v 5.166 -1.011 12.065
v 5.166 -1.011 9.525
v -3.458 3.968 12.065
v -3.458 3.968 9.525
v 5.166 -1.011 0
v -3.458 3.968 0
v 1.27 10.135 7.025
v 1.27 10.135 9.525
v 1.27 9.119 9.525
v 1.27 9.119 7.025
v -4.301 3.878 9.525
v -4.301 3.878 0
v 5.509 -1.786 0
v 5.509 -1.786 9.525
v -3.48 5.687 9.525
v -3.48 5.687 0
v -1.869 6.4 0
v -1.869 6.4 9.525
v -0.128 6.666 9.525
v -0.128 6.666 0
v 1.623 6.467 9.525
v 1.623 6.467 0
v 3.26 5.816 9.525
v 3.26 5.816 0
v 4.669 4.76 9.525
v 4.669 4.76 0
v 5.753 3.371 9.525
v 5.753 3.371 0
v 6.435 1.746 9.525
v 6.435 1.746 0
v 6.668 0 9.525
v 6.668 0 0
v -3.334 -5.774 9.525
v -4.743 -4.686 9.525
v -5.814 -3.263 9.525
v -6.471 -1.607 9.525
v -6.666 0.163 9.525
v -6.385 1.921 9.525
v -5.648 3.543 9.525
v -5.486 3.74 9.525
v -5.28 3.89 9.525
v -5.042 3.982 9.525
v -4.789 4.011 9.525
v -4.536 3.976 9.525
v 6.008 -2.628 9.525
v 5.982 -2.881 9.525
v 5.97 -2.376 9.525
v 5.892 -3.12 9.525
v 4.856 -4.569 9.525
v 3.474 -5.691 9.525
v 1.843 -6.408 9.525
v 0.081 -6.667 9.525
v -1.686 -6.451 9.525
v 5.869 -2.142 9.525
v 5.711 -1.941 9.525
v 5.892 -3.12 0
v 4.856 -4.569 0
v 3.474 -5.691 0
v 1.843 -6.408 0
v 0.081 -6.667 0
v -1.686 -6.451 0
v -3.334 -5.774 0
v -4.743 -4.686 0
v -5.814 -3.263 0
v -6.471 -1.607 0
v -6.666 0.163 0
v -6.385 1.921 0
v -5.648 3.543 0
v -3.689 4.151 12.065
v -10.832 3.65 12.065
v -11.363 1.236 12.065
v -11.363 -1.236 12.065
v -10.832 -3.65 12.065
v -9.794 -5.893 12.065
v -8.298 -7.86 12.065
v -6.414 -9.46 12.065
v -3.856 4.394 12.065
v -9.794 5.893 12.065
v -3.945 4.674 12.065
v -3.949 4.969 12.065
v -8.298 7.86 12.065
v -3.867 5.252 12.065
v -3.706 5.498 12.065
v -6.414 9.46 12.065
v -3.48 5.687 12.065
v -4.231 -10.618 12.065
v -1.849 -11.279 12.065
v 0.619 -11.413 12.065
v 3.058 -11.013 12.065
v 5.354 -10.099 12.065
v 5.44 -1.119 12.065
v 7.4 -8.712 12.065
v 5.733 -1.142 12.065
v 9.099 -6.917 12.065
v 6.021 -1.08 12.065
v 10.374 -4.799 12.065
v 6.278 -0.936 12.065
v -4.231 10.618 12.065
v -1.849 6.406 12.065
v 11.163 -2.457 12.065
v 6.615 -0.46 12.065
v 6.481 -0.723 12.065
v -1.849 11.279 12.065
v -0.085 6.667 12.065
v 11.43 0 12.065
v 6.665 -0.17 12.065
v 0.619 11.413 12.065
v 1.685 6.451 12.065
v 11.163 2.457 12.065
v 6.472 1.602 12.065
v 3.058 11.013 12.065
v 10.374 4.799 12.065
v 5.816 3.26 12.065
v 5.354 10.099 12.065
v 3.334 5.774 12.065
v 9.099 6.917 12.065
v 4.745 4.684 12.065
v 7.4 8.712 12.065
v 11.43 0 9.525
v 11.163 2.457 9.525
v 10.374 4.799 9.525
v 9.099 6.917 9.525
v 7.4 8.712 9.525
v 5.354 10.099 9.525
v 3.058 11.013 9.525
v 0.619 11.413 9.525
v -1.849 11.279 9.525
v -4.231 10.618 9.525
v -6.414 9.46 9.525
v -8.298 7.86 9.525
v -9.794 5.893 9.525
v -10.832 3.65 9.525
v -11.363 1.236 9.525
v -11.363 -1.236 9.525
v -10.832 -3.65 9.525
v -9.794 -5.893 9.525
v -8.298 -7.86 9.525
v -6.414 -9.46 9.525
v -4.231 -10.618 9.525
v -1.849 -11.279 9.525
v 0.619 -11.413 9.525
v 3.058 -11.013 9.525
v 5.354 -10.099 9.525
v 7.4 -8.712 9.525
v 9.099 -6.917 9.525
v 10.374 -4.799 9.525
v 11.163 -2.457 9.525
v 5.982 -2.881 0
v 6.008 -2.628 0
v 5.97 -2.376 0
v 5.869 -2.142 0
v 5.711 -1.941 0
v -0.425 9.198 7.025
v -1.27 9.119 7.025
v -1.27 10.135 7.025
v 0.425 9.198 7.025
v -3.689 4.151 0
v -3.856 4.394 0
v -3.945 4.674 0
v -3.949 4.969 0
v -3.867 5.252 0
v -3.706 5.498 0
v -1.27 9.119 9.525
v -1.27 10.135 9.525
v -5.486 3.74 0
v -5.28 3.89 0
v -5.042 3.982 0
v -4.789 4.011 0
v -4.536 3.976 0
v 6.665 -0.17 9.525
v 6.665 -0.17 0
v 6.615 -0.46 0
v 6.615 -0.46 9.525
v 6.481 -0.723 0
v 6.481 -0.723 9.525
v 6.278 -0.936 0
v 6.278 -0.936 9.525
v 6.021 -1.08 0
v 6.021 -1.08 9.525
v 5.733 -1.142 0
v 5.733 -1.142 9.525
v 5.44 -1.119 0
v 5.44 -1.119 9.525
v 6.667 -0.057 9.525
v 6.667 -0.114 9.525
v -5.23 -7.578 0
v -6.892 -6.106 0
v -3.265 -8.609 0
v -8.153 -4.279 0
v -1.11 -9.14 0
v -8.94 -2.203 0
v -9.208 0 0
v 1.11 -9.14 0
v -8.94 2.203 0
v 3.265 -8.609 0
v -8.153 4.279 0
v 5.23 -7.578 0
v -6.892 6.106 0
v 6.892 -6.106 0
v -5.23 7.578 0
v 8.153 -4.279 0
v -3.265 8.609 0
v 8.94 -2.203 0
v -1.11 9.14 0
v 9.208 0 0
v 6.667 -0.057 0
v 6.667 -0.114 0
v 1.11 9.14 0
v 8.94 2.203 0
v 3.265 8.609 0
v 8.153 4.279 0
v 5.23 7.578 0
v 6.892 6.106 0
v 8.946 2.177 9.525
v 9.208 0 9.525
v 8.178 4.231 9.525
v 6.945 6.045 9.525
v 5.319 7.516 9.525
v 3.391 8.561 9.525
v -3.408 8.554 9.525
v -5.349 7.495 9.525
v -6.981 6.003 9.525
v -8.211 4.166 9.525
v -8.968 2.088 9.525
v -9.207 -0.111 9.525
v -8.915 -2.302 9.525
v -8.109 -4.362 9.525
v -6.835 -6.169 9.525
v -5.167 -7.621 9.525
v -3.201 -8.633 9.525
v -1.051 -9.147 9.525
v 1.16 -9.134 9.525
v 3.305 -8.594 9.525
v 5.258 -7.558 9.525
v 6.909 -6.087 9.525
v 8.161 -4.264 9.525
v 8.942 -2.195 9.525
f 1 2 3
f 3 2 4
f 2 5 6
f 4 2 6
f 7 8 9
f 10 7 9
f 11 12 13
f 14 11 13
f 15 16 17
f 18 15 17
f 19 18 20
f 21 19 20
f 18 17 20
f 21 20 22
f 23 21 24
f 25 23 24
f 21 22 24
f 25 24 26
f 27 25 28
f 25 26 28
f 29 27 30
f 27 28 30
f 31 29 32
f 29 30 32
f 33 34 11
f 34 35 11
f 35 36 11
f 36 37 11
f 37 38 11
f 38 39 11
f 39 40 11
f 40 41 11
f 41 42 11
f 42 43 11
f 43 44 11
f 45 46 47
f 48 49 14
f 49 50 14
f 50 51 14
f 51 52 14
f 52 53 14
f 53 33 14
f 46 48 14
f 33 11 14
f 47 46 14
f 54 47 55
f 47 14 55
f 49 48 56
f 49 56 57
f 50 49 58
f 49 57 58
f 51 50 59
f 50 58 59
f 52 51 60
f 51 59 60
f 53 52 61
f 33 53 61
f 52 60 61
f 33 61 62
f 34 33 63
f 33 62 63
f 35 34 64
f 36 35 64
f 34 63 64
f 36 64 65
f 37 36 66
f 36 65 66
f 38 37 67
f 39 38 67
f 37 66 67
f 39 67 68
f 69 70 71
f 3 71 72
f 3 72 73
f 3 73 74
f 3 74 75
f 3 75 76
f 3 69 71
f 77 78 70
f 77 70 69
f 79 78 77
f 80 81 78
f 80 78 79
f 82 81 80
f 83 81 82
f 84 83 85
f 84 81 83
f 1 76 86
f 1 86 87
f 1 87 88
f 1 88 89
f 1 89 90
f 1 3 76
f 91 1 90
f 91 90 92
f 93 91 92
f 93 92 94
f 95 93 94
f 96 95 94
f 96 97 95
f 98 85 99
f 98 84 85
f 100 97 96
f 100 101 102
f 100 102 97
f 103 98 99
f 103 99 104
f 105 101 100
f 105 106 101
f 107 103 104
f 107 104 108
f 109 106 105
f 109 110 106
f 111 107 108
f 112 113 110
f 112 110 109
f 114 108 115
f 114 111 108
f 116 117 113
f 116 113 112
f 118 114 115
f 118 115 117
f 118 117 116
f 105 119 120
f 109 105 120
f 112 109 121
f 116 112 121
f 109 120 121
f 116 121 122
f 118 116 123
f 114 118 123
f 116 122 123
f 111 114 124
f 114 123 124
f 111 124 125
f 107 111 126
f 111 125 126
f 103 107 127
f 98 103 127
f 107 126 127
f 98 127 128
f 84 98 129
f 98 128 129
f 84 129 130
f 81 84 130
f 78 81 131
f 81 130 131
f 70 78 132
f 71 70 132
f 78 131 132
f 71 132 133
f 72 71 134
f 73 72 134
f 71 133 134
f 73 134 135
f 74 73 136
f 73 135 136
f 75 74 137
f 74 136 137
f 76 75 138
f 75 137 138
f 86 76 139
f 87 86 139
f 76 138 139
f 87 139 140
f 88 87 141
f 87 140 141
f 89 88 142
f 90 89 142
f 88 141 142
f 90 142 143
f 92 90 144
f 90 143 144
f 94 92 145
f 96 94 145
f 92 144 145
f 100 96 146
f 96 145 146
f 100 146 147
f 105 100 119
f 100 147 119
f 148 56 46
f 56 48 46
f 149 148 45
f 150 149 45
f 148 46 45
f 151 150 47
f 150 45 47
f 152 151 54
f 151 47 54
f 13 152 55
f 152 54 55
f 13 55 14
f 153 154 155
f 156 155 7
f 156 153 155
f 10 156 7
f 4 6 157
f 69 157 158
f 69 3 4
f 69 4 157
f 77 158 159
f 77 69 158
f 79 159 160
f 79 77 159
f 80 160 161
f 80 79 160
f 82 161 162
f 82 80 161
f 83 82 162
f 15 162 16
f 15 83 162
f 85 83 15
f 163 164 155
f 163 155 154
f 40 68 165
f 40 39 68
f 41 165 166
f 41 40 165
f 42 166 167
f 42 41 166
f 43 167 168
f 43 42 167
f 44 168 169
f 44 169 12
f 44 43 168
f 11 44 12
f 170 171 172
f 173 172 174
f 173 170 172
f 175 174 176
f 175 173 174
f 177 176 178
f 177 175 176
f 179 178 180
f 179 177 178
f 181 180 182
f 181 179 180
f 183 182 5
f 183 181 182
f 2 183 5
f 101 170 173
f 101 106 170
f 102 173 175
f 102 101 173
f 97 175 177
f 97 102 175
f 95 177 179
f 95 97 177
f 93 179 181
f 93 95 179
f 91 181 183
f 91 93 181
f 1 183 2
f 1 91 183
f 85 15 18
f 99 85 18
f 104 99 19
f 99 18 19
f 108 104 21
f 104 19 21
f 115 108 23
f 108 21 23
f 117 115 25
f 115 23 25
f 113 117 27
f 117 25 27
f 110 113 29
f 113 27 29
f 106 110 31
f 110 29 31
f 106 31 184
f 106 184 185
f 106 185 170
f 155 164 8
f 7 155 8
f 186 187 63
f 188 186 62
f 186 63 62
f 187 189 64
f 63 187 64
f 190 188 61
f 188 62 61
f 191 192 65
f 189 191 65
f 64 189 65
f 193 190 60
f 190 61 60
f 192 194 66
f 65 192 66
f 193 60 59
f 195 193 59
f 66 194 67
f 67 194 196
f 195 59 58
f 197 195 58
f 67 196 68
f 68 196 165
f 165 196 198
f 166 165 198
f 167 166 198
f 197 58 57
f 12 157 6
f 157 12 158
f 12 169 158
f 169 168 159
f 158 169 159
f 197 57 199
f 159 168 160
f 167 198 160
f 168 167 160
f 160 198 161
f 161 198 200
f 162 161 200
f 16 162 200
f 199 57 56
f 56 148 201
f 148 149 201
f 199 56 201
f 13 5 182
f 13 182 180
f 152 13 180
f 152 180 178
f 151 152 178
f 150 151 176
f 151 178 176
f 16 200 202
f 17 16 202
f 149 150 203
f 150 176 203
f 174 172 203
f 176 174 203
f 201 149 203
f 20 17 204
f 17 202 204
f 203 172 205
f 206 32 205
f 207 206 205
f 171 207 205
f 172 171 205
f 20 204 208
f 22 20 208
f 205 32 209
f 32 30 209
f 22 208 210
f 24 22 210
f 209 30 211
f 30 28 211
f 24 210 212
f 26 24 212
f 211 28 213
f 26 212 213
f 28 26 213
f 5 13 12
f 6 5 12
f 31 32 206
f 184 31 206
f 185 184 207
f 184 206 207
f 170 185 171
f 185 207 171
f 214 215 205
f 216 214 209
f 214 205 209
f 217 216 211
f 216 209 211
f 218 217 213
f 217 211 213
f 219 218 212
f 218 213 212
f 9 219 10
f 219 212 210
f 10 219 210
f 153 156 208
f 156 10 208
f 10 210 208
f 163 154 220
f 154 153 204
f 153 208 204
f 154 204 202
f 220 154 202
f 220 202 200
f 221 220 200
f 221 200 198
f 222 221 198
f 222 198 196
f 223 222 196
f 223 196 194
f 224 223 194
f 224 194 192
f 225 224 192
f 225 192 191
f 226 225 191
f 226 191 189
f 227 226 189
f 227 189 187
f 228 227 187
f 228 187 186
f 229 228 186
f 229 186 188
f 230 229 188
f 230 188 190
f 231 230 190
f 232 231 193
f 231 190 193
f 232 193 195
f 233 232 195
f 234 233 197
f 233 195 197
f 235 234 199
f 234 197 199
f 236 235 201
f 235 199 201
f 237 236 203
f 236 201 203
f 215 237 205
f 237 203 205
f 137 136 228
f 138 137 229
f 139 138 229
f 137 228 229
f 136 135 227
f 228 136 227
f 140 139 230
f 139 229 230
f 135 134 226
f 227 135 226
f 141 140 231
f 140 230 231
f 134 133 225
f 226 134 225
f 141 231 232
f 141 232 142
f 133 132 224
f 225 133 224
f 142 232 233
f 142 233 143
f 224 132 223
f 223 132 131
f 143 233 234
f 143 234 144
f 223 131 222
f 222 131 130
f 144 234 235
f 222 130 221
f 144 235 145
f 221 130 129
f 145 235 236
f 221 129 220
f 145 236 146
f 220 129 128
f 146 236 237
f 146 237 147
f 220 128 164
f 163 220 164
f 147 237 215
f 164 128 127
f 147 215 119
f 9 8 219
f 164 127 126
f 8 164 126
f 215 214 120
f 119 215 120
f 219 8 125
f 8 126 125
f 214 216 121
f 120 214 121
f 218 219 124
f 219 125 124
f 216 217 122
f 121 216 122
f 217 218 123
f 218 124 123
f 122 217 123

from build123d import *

# Parameters (mm, degrees)
F0_R     = 9.2075
F1_DEPTH = 9.525
F2_R     = 11.43
F3_DEPTH = 2.54
F4_W     = 2.54
F4_H     = 1.016
F5_DEPTH = 2.5
F6_R     = 1


with BuildPart() as f1:
    # F0 (on Top) → F1 (new body)
    with BuildSketch(Plane.XY):
        Circle(F0_R)
        with BuildLine():
            ThreePointArc((-4.7279164178, 4.7013149858), (2.5428501267, 6.1635598061), (6.6675, 0))
            ThreePointArc((6.6675, 0), (6.6092244332, -0.8796070953), (6.4354164178, -1.7438382319))
            ThreePointArc((6.4354164178, -1.7438382319), (6.3636547335, -1.9898378534), (6.2824932589, -2.2328982741))
            ThreePointArc((6.2824932589, -2.2328982741), (-3.33375, -5.7742243797), (-5.0749932589, 4.3243496242))
            ThreePointArc((-5.0749932589, 4.3243496242), (-4.9050774972, 4.5161677335), (-4.7279164178, 4.7013149858))
        make_face(mode=Mode.SUBTRACT)
        with BuildLine():
            Line((6.4354164178, -1.7438382319), (-4.7279164178, 4.7013149858))
            ThreePointArc((-4.7279164178, 4.7013149858), (-4.9050774972, 4.5161677335), (-5.0749932589, 4.3243496242))
            Line((-5.0749932589, 4.3243496242), (6.2824932589, -2.2328982741))
            ThreePointArc((6.2824932589, -2.2328982741), (6.3636547335, -1.9898378534), (6.4354164178, -1.7438382319))
        make_face()
    extrude(amount=F1_DEPTH)

    # F2 (on face) → F3 (join)
    with BuildSketch(Plane.XY.offset(9.525)):
        Circle(F2_R)
        with BuildLine():
            ThreePointArc((-4.7279164178, 4.7013149858), (3.33375, 5.7742243797), (6.4354164178, -1.7438382319))
            Line((6.4354164178, -1.7438382319), (-4.7279164178, 4.7013149858))
        make_face(mode=Mode.SUBTRACT)
    extrude(amount=F3_DEPTH)

    # F4 (on face) → F5 (join)
    with BuildSketch(Plane(origin=(0, 0, 9.525), x_dir=(1, 0, 0), z_dir=(0, 0, -1))):
        with Locations((0, -9.6274932014)):
            Rectangle(F4_W, F4_H)
    extrude(amount=F5_DEPTH)

    # F6
    f6_edges = [f1.edges().sort_by_distance(p)[0] for p in [
        (-4.727916, 4.701315, 6.0325),
        (6.435416, -1.743838, 6.0325),
        (-5.074993, 4.32435, 4.7625),
        (6.282493, -2.232898, 4.7625),
    ]]
    fillet(f6_edges, radius=F6_R)


solid = f1.part
